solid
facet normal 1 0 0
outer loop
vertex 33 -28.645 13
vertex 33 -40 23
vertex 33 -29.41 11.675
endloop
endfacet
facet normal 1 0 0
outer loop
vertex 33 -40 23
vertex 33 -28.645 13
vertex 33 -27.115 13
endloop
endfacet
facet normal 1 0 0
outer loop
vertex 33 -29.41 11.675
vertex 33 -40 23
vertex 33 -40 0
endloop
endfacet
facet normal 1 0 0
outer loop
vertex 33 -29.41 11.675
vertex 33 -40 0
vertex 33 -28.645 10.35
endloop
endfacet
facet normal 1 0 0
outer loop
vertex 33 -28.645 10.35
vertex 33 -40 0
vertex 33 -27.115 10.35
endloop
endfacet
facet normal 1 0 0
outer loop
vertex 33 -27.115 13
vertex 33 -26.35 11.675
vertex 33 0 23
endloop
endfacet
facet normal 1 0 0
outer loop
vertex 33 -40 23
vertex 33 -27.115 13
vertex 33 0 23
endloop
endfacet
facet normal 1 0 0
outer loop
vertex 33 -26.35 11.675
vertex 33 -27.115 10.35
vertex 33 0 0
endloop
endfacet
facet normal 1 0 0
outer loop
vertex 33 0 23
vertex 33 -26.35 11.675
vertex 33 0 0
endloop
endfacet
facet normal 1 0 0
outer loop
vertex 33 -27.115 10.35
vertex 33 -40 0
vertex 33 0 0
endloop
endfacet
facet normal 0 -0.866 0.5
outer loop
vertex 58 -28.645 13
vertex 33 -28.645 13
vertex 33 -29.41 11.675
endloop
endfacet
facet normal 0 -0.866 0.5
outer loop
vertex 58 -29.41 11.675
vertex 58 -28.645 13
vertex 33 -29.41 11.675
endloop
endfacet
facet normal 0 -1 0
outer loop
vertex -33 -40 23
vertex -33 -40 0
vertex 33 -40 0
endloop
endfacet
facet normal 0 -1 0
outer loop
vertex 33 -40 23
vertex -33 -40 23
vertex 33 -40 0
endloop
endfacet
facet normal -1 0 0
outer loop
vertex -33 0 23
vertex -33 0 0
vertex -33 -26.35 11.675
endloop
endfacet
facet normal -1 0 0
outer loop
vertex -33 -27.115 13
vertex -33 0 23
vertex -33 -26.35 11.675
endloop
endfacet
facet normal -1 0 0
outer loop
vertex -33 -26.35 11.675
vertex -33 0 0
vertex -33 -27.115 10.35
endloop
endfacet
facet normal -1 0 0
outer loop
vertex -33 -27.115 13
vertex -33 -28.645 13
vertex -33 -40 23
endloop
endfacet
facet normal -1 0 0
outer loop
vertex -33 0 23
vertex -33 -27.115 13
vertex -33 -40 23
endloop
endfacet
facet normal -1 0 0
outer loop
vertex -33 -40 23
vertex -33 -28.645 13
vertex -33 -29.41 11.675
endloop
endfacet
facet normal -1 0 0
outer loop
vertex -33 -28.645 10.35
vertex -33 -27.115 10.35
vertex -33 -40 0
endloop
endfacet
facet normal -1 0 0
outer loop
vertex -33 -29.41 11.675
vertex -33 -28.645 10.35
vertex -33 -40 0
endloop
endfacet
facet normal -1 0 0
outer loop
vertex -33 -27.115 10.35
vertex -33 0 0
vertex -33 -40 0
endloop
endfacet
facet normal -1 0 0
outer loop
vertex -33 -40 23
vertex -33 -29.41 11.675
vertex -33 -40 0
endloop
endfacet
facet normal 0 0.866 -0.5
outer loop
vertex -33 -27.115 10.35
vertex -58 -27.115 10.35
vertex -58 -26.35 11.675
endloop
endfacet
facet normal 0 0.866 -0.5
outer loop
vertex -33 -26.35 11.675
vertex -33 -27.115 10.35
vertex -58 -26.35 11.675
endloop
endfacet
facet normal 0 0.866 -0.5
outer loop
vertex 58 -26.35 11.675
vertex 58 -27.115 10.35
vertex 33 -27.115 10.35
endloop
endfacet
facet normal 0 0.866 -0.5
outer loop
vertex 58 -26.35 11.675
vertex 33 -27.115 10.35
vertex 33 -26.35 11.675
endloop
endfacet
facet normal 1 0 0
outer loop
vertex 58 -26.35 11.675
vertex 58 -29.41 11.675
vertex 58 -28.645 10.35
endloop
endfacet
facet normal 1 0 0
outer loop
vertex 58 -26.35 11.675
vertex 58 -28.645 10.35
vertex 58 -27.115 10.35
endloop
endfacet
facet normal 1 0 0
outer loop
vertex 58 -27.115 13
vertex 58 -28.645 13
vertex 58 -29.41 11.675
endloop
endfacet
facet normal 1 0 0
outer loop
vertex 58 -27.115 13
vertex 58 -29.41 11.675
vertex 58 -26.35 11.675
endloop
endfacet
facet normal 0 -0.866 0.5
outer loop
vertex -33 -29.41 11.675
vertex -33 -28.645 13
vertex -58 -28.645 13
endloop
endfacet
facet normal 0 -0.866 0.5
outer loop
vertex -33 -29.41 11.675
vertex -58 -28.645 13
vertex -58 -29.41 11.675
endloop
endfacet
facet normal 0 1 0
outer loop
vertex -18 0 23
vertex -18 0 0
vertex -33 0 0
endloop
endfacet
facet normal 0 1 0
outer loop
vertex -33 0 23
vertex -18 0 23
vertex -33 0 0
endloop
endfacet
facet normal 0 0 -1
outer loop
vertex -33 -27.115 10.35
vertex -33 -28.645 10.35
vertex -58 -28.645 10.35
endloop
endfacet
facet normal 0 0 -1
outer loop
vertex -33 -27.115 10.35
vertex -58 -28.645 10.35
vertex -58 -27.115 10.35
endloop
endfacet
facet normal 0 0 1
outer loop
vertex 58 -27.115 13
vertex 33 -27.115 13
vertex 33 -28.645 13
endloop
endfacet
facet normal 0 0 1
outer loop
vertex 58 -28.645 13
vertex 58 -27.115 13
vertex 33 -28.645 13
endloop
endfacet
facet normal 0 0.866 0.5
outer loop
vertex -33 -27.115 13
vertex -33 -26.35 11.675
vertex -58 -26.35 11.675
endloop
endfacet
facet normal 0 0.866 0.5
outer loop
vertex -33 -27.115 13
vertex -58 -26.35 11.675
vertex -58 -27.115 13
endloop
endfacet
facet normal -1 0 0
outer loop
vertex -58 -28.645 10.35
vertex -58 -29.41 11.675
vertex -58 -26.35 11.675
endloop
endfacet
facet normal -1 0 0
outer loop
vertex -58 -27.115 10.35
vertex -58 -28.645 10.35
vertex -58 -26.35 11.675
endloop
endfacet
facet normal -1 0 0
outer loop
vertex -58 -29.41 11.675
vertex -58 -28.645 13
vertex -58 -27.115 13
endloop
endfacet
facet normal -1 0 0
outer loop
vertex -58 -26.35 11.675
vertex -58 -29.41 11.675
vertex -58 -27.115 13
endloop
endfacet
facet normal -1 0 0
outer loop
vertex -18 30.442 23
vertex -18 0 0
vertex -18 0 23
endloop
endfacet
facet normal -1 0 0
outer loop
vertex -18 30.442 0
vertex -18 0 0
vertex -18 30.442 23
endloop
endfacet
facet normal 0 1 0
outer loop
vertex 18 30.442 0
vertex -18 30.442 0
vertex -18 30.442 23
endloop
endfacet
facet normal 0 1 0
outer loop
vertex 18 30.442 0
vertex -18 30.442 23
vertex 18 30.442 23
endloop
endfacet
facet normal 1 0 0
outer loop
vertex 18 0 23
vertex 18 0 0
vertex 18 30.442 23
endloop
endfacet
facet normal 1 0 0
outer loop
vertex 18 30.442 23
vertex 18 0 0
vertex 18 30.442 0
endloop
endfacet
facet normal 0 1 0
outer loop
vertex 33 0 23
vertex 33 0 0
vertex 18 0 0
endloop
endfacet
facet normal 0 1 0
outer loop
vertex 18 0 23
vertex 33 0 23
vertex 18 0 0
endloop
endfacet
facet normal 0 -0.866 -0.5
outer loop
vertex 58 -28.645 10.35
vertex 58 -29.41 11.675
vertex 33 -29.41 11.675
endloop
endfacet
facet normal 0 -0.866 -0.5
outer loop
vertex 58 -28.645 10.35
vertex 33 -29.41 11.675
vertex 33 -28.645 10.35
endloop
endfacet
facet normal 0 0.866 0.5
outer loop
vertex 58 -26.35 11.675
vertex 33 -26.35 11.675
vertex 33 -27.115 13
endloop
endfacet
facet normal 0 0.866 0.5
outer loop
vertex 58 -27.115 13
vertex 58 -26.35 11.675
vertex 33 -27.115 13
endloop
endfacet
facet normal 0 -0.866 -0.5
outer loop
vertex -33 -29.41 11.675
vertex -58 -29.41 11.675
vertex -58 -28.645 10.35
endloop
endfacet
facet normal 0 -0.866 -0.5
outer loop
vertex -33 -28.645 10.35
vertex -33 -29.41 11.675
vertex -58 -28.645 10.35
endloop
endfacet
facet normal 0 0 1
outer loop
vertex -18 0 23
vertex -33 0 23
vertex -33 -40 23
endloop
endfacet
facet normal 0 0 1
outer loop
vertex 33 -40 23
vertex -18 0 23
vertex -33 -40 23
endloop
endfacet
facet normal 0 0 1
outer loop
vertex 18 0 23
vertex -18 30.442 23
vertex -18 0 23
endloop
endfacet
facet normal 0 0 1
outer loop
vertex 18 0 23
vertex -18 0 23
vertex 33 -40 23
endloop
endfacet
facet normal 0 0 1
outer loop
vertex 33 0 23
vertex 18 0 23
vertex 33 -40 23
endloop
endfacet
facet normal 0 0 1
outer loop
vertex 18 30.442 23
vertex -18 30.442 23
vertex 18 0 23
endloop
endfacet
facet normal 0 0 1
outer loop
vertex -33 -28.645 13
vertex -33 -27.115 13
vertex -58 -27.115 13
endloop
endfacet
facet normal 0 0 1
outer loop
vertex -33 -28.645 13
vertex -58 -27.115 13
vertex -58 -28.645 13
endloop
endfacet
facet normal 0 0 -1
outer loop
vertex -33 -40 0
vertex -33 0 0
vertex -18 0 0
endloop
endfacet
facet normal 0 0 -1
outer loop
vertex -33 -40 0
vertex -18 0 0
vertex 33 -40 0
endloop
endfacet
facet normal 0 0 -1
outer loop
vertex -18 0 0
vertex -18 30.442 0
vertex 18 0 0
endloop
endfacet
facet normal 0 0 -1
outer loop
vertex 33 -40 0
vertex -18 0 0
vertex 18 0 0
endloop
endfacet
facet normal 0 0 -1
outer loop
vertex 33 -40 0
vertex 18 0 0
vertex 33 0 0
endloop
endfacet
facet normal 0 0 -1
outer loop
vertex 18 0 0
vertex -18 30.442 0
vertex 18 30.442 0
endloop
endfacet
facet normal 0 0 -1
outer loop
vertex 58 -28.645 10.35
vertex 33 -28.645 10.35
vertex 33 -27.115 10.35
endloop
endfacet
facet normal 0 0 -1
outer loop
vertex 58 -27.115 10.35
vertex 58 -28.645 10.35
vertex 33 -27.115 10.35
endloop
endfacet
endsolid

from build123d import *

# Parameters (mm, degrees)
F0_W     = 36
F0_H     = 30.441777
F1_DEPTH = 23
F3_DEPTH = 25
F5_DEPTH = 91


with BuildPart() as f1:
    # F0 (on Top) → F1 (new body)
    with BuildSketch(Plane.XY):
        with Locations((0, 15.220888)):
            Rectangle(F0_W, F0_H)
        Polygon((18, 0), (-18, 0), (-33, 0), (-33, -40), (33, -40), (33, 0), align=None)
    extrude(amount=F1_DEPTH)

    # F2 (on face) → F3 (join)
    with BuildSketch(Plane.YZ.offset(33)):
        Polygon((-27.114989, 13), (-28.644967, 13), (-29.409956, 11.675), (-28.644967, 10.35), (-27.114989, 10.35), (-26.35, 11.675), align=None)
    extrude(amount=F3_DEPTH)

    # F4 (on face) → F5 (join)
    with BuildSketch(Plane.YZ.offset(33)):
        Polygon((-27.114989, 13), (-28.644967, 13), (-29.409956, 11.675), (-28.644967, 10.35), (-27.114989, 10.35), (-26.35, 11.675), align=None)
    extrude(amount=-F5_DEPTH)


solid = f1.part
